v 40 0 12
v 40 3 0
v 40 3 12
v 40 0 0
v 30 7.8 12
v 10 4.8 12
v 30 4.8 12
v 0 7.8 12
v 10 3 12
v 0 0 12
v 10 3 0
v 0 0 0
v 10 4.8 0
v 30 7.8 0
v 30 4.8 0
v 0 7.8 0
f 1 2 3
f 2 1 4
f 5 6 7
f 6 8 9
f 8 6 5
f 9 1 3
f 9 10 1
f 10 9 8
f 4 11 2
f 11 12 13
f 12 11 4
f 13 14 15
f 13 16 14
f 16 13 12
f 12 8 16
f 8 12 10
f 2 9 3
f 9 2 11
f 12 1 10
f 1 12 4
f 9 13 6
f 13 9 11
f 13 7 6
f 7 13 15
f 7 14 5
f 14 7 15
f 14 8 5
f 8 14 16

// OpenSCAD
width=12;

backdepth=3;
backhang=40;

backwidth=1.8;

cube([backhang, backdepth, width]);

translate([0, backdepth, 0]) {
  color("blue") {
    cube([10, backwidth, width]);
  }
}

fronthang=30;

translate([0, backdepth+backwidth, 0]) {
  color("red") {
    cube([fronthang, backdepth, width]);
  }
}

hangerhang = 15;
hanger_length = 60;

/*
translate([fronthang-hangerhang, backdepth+backdepth+backwidth, 0]) {
  color("orange") {
    cube([hangerhang, hanger_length, width]);
  }
}

hook_height = 20;

translate([fronthang-hook_height, backdepth+backdepth+backwidth+hanger_length, 0]) {
  color("green") {
    cube([hook_height, backdepth, width]);
  }
}
*/
